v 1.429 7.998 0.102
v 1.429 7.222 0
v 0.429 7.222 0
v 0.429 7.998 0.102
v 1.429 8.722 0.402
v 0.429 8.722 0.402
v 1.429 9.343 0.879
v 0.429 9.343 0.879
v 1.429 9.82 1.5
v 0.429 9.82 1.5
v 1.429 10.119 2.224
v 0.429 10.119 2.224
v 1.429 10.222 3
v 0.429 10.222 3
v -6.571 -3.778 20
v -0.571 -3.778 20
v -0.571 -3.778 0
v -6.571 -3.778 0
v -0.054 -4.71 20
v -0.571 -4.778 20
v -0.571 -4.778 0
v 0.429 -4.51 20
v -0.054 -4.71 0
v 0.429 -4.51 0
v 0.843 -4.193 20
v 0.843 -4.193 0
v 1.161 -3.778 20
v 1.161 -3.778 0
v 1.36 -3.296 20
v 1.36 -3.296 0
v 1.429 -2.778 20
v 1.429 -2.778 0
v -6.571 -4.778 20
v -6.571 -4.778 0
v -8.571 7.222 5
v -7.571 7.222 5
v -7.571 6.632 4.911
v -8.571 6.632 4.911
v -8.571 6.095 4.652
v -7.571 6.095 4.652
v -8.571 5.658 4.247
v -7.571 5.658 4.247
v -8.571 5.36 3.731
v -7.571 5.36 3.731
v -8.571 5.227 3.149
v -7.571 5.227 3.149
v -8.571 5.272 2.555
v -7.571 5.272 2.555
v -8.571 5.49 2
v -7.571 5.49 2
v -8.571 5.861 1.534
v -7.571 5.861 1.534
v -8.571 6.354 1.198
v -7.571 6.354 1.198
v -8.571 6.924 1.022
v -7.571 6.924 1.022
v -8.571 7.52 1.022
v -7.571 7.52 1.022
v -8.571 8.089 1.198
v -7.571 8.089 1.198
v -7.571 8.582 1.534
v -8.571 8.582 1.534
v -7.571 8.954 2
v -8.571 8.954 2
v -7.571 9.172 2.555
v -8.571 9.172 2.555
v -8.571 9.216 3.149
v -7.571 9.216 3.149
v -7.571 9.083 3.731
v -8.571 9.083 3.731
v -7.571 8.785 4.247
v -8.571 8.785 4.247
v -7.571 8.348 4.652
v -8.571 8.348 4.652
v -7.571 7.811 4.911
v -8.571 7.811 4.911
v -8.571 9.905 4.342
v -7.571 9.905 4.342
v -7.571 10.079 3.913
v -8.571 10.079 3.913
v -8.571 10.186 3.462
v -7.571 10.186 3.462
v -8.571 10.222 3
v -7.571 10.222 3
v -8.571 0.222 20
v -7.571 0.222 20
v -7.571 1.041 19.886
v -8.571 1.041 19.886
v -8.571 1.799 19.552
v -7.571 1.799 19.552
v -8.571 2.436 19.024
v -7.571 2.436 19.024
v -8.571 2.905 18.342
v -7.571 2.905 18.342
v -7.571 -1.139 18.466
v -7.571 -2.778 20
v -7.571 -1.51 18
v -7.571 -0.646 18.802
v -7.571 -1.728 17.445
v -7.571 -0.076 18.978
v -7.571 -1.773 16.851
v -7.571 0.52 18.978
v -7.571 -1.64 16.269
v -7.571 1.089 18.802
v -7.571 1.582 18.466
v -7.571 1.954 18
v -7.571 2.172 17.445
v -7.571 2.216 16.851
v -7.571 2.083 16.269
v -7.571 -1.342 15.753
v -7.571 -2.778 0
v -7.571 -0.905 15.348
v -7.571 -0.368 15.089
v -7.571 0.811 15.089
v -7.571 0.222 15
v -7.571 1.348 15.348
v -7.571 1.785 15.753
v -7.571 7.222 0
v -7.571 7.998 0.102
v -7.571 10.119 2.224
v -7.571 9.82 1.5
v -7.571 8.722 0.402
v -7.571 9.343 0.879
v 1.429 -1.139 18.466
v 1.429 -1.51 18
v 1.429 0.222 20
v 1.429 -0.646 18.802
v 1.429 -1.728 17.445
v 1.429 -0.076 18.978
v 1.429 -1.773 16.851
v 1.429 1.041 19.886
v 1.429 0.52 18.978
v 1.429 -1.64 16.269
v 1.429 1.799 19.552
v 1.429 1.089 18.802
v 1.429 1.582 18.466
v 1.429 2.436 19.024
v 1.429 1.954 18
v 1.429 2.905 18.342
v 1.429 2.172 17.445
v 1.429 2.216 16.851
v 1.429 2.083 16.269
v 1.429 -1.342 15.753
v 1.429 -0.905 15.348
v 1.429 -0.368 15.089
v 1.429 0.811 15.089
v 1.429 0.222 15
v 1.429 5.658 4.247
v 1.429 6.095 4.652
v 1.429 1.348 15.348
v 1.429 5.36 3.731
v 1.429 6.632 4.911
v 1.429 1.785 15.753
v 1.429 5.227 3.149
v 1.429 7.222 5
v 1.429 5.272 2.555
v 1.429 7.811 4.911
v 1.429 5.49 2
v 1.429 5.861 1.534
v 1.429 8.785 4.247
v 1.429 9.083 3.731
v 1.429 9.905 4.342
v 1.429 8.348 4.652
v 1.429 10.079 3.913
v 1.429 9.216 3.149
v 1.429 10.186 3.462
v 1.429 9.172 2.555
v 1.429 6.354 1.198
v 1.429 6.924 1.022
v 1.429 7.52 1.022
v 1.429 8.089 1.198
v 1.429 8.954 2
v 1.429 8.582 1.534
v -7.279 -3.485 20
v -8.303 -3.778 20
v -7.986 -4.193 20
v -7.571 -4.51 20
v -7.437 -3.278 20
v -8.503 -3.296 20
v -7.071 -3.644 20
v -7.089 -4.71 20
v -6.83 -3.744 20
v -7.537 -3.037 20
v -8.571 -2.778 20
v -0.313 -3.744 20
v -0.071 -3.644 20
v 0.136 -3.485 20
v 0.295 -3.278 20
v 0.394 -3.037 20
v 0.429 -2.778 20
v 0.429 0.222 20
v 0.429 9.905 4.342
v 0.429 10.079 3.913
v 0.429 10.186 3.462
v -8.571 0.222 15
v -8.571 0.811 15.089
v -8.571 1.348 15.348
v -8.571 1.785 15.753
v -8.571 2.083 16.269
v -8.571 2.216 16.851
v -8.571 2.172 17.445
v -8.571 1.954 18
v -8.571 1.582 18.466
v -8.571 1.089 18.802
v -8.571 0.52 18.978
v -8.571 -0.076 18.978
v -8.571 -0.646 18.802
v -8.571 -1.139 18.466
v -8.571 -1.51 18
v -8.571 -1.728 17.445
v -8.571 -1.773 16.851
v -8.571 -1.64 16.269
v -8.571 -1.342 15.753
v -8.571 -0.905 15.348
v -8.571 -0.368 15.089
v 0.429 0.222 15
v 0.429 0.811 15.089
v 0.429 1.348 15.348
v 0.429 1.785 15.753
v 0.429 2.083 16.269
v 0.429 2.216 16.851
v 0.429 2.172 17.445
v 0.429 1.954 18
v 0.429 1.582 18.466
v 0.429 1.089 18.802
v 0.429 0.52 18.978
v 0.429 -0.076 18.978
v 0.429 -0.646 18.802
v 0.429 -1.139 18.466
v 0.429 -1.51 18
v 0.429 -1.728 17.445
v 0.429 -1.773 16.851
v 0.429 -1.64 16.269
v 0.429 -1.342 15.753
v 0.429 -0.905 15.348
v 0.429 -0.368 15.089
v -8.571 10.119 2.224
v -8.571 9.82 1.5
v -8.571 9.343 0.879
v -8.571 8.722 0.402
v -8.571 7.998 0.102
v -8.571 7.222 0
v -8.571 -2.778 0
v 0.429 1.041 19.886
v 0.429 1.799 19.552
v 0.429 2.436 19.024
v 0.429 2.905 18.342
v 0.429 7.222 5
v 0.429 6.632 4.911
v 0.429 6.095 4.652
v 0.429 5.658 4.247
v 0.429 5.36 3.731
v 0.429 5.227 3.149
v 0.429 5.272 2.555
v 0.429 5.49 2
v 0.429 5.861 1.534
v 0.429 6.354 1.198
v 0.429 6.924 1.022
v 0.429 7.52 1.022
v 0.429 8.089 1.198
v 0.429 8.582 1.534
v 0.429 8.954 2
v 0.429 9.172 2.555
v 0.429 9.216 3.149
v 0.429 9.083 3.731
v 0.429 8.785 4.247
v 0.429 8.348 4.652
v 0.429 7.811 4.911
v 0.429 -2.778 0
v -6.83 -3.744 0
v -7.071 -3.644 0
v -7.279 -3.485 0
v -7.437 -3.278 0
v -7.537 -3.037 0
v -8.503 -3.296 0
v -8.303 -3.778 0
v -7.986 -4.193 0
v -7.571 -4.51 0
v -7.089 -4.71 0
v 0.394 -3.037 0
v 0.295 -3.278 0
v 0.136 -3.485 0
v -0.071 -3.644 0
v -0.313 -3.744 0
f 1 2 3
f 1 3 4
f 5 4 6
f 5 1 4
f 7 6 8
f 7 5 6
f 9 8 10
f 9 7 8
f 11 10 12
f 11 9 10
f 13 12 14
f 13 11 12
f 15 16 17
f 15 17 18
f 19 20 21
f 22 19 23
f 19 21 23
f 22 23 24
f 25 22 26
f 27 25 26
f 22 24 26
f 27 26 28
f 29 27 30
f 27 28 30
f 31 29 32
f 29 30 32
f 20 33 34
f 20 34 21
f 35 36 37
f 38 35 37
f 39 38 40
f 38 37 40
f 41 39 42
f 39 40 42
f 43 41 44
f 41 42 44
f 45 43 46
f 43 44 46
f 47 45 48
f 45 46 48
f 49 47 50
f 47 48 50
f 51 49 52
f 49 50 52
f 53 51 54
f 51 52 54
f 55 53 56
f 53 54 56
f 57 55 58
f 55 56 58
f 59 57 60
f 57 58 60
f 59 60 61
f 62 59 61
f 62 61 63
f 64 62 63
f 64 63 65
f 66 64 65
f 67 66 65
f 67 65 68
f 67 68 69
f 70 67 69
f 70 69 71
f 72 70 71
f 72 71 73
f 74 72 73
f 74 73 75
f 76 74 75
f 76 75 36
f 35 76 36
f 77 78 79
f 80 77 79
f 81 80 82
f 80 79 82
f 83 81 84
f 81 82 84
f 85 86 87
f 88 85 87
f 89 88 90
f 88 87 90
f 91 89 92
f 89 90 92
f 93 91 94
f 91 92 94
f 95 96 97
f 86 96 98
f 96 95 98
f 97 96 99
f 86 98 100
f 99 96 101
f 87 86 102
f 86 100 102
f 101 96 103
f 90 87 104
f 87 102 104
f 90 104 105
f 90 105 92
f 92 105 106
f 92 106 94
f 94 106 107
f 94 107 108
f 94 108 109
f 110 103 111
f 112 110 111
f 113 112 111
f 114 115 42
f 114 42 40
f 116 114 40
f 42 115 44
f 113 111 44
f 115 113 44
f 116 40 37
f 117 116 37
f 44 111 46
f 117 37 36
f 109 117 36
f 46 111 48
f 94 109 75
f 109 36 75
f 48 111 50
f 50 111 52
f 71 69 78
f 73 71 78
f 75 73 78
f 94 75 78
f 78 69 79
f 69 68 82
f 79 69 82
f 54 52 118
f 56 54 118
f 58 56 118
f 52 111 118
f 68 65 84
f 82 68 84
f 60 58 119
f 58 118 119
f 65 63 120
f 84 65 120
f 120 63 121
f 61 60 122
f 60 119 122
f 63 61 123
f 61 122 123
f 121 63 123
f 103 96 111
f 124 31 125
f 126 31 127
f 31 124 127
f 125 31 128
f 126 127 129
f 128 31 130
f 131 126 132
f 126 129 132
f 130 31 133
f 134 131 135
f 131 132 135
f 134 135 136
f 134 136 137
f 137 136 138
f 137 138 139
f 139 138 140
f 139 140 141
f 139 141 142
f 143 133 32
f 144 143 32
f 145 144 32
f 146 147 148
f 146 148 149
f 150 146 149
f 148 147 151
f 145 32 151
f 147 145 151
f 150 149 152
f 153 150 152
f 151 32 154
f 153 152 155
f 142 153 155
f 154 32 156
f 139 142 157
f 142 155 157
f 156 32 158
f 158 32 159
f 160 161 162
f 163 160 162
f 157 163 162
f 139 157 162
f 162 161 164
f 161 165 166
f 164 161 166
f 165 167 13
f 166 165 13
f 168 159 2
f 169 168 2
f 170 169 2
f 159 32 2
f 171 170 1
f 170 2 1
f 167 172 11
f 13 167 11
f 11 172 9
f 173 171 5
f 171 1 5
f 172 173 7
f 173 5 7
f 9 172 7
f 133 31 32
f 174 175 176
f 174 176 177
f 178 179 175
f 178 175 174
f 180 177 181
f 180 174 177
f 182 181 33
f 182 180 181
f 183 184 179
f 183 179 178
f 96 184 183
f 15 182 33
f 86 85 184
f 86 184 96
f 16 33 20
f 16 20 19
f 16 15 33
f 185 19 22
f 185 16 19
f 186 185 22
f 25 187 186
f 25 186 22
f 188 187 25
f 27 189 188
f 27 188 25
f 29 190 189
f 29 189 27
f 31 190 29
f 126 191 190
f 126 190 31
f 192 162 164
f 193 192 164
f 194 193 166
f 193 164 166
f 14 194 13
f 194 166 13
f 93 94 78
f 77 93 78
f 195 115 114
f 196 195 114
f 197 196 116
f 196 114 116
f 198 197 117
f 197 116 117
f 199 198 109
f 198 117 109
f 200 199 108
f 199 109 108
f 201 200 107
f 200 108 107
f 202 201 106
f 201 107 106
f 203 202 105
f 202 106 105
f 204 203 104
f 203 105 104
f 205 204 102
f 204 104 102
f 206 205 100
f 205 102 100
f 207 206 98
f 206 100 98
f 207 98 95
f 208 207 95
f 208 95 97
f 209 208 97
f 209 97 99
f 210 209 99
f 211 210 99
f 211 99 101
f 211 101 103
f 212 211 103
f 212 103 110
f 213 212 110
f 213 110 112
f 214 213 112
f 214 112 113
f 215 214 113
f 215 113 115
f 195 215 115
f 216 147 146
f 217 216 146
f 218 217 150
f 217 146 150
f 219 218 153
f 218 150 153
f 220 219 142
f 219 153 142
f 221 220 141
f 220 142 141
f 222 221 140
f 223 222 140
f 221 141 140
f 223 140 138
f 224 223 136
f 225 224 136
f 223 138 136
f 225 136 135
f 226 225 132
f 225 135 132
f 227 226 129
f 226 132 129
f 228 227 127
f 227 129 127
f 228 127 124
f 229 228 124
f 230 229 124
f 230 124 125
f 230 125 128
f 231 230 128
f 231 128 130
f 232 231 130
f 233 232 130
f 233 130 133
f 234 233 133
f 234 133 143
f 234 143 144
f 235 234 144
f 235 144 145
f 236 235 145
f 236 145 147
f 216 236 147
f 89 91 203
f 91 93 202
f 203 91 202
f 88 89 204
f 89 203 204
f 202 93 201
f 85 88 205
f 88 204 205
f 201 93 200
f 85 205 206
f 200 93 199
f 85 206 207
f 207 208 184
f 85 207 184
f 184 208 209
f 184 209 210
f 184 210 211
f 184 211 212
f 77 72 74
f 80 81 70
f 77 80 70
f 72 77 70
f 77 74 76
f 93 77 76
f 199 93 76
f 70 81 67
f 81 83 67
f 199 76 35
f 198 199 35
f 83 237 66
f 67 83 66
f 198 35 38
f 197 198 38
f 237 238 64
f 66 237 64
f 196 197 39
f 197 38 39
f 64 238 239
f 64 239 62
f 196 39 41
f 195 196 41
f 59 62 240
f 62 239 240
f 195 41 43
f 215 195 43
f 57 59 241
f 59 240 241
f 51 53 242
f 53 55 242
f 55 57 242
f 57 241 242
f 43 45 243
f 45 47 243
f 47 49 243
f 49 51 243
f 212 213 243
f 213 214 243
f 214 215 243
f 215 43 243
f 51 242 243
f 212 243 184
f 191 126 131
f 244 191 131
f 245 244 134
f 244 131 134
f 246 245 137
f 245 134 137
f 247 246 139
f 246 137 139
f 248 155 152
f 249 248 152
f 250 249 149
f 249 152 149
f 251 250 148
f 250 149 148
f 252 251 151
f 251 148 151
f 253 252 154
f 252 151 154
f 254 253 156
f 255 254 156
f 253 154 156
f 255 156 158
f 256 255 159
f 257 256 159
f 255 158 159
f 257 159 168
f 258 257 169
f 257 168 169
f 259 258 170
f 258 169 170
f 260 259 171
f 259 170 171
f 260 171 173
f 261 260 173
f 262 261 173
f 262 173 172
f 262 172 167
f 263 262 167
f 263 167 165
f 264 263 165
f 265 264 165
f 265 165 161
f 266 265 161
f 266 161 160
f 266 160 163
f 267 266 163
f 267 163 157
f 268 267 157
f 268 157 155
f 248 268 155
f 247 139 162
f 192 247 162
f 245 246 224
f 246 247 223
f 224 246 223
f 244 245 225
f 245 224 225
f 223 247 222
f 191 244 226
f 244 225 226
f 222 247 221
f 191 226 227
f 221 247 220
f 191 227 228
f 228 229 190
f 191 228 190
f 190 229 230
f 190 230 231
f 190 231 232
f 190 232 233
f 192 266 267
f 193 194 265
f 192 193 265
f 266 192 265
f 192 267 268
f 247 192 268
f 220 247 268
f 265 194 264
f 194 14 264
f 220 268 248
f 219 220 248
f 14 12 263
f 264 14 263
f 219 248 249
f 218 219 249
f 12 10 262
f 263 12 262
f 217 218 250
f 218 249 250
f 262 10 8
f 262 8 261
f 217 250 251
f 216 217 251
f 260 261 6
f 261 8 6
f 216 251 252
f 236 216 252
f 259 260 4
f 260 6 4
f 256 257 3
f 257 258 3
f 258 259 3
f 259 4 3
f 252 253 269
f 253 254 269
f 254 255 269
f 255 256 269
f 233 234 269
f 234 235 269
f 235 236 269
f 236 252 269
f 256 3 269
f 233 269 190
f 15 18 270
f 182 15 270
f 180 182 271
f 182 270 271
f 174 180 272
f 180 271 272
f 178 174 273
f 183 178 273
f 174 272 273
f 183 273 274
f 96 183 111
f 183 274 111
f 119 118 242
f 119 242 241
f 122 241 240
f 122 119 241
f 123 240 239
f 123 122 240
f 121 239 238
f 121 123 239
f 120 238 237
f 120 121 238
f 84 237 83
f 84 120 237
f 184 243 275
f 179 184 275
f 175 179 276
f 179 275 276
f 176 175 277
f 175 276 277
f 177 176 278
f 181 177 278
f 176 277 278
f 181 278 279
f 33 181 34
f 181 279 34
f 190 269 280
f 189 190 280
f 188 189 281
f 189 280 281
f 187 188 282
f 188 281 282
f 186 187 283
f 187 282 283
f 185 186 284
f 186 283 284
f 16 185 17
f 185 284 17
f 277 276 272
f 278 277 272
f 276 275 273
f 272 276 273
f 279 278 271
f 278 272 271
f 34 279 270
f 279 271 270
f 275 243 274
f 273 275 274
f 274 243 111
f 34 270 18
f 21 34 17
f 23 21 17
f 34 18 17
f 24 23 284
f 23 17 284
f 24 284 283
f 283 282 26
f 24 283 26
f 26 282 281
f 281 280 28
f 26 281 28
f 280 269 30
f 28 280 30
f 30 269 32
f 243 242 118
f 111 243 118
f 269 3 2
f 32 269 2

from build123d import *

# Parameters (mm, degrees)
T_LE_DE_BASE_PLI_E1_DEPTH = 20
ESQUISSE7_R               = 2
ENL_V_MAT_EXTRU_1_DEPTH   = 25.586228611
ENL_V_MAT_EXTRU_2_DEPTH   = 25.586228611


# Sheet-metal steps are written as plain solids
with BuildPart() as part:
    # Esquisse2 → Tôle de base pliée1 (new body)
    with BuildSketch(Plane.XY):
        with BuildLine():
            Line((-8.571428571, 10.221674877), (-8.571428571, -2.778325123))
            ThreePointArc((-8.571428571, -2.778325123), (-7.985642134, -4.192538686), (-6.571428571, -4.778325123))
            Line((-6.571428571, -4.778325123), (-0.571428571, -4.778325123))
            ThreePointArc((-0.571428571, -4.778325123), (0.842784991, -4.192538686), (1.428571429, -2.778325123))
            Line((1.428571429, -2.778325123), (1.428571429, 10.221674877))
            Line((1.428571429, 10.221674877), (0.428571429, 10.221674877))
            Line((0.428571429, 10.221674877), (0.428571429, -2.778325123))
            ThreePointArc((0.428571429, -2.778325123), (0.13567821, -3.485431904), (-0.571428571, -3.778325123))
            Line((-0.571428571, -3.778325123), (-6.571428571, -3.778325123))
            ThreePointArc((-6.571428571, -3.778325123), (-7.278535353, -3.485431904), (-7.571428571, -2.778325123))
            Line((-7.571428571, -2.778325123), (-7.571428571, 10.221674877))
            Line((-7.571428571, 10.221674877), (-8.571428571, 10.221674877))
        make_face()
    extrude(amount=T_LE_DE_BASE_PLI_E1_DEPTH)

    # Esquisse7 → Enlèv. mat.-Extru.1 (cut, through all)
    with BuildSketch(Plane(origin=(1.428571429, 0, 0), x_dir=(0, 0, -1), z_dir=(1, 0, 0))):
        with Locations(Location((-3, 7.221674877, 0), (0, 0, 180))):
            Circle(ESQUISSE7_R)
        with Locations((-17, 0.221674877)):
            Circle(ESQUISSE7_R)
        with BuildLine():
            Line((-18.341640786, 2.90495645), (-4.341640786, 9.90495645))
            ThreePointArc((-4.341640786, 9.90495645), (-3.689258762, 10.141421845), (-3, 10.221674877))
            Line((-3, 10.221674877), (-20, 10.221674877))
            Line((-20, 10.221674877), (-20, 0.221674877))
            ThreePointArc((-20, 0.221674877), (-19.551952425, 1.798868213), (-18.341640786, 2.90495645))
        make_face()
    extrude(amount=-ENL_V_MAT_EXTRU_1_DEPTH, mode=Mode.SUBTRACT)

    # Esquisse9 → Enlèv. mat.-Extru.2 (cut, through all)
    with BuildSketch(Plane(origin=(1.428571429, 0, 0), x_dir=(0, 0, -1), z_dir=(1, 0, 0))):
        with BuildLine():
            Line((-3, 10.221674877), (0, 10.221674877))
            Line((0, 10.221674877), (0, 7.221674877))
            ThreePointArc((0, 7.221674877), (-0.878679656, 9.34299522), (-3, 10.221674877))
        make_face()
    extrude(amount=-ENL_V_MAT_EXTRU_2_DEPTH, mode=Mode.SUBTRACT)


solid = part.part
